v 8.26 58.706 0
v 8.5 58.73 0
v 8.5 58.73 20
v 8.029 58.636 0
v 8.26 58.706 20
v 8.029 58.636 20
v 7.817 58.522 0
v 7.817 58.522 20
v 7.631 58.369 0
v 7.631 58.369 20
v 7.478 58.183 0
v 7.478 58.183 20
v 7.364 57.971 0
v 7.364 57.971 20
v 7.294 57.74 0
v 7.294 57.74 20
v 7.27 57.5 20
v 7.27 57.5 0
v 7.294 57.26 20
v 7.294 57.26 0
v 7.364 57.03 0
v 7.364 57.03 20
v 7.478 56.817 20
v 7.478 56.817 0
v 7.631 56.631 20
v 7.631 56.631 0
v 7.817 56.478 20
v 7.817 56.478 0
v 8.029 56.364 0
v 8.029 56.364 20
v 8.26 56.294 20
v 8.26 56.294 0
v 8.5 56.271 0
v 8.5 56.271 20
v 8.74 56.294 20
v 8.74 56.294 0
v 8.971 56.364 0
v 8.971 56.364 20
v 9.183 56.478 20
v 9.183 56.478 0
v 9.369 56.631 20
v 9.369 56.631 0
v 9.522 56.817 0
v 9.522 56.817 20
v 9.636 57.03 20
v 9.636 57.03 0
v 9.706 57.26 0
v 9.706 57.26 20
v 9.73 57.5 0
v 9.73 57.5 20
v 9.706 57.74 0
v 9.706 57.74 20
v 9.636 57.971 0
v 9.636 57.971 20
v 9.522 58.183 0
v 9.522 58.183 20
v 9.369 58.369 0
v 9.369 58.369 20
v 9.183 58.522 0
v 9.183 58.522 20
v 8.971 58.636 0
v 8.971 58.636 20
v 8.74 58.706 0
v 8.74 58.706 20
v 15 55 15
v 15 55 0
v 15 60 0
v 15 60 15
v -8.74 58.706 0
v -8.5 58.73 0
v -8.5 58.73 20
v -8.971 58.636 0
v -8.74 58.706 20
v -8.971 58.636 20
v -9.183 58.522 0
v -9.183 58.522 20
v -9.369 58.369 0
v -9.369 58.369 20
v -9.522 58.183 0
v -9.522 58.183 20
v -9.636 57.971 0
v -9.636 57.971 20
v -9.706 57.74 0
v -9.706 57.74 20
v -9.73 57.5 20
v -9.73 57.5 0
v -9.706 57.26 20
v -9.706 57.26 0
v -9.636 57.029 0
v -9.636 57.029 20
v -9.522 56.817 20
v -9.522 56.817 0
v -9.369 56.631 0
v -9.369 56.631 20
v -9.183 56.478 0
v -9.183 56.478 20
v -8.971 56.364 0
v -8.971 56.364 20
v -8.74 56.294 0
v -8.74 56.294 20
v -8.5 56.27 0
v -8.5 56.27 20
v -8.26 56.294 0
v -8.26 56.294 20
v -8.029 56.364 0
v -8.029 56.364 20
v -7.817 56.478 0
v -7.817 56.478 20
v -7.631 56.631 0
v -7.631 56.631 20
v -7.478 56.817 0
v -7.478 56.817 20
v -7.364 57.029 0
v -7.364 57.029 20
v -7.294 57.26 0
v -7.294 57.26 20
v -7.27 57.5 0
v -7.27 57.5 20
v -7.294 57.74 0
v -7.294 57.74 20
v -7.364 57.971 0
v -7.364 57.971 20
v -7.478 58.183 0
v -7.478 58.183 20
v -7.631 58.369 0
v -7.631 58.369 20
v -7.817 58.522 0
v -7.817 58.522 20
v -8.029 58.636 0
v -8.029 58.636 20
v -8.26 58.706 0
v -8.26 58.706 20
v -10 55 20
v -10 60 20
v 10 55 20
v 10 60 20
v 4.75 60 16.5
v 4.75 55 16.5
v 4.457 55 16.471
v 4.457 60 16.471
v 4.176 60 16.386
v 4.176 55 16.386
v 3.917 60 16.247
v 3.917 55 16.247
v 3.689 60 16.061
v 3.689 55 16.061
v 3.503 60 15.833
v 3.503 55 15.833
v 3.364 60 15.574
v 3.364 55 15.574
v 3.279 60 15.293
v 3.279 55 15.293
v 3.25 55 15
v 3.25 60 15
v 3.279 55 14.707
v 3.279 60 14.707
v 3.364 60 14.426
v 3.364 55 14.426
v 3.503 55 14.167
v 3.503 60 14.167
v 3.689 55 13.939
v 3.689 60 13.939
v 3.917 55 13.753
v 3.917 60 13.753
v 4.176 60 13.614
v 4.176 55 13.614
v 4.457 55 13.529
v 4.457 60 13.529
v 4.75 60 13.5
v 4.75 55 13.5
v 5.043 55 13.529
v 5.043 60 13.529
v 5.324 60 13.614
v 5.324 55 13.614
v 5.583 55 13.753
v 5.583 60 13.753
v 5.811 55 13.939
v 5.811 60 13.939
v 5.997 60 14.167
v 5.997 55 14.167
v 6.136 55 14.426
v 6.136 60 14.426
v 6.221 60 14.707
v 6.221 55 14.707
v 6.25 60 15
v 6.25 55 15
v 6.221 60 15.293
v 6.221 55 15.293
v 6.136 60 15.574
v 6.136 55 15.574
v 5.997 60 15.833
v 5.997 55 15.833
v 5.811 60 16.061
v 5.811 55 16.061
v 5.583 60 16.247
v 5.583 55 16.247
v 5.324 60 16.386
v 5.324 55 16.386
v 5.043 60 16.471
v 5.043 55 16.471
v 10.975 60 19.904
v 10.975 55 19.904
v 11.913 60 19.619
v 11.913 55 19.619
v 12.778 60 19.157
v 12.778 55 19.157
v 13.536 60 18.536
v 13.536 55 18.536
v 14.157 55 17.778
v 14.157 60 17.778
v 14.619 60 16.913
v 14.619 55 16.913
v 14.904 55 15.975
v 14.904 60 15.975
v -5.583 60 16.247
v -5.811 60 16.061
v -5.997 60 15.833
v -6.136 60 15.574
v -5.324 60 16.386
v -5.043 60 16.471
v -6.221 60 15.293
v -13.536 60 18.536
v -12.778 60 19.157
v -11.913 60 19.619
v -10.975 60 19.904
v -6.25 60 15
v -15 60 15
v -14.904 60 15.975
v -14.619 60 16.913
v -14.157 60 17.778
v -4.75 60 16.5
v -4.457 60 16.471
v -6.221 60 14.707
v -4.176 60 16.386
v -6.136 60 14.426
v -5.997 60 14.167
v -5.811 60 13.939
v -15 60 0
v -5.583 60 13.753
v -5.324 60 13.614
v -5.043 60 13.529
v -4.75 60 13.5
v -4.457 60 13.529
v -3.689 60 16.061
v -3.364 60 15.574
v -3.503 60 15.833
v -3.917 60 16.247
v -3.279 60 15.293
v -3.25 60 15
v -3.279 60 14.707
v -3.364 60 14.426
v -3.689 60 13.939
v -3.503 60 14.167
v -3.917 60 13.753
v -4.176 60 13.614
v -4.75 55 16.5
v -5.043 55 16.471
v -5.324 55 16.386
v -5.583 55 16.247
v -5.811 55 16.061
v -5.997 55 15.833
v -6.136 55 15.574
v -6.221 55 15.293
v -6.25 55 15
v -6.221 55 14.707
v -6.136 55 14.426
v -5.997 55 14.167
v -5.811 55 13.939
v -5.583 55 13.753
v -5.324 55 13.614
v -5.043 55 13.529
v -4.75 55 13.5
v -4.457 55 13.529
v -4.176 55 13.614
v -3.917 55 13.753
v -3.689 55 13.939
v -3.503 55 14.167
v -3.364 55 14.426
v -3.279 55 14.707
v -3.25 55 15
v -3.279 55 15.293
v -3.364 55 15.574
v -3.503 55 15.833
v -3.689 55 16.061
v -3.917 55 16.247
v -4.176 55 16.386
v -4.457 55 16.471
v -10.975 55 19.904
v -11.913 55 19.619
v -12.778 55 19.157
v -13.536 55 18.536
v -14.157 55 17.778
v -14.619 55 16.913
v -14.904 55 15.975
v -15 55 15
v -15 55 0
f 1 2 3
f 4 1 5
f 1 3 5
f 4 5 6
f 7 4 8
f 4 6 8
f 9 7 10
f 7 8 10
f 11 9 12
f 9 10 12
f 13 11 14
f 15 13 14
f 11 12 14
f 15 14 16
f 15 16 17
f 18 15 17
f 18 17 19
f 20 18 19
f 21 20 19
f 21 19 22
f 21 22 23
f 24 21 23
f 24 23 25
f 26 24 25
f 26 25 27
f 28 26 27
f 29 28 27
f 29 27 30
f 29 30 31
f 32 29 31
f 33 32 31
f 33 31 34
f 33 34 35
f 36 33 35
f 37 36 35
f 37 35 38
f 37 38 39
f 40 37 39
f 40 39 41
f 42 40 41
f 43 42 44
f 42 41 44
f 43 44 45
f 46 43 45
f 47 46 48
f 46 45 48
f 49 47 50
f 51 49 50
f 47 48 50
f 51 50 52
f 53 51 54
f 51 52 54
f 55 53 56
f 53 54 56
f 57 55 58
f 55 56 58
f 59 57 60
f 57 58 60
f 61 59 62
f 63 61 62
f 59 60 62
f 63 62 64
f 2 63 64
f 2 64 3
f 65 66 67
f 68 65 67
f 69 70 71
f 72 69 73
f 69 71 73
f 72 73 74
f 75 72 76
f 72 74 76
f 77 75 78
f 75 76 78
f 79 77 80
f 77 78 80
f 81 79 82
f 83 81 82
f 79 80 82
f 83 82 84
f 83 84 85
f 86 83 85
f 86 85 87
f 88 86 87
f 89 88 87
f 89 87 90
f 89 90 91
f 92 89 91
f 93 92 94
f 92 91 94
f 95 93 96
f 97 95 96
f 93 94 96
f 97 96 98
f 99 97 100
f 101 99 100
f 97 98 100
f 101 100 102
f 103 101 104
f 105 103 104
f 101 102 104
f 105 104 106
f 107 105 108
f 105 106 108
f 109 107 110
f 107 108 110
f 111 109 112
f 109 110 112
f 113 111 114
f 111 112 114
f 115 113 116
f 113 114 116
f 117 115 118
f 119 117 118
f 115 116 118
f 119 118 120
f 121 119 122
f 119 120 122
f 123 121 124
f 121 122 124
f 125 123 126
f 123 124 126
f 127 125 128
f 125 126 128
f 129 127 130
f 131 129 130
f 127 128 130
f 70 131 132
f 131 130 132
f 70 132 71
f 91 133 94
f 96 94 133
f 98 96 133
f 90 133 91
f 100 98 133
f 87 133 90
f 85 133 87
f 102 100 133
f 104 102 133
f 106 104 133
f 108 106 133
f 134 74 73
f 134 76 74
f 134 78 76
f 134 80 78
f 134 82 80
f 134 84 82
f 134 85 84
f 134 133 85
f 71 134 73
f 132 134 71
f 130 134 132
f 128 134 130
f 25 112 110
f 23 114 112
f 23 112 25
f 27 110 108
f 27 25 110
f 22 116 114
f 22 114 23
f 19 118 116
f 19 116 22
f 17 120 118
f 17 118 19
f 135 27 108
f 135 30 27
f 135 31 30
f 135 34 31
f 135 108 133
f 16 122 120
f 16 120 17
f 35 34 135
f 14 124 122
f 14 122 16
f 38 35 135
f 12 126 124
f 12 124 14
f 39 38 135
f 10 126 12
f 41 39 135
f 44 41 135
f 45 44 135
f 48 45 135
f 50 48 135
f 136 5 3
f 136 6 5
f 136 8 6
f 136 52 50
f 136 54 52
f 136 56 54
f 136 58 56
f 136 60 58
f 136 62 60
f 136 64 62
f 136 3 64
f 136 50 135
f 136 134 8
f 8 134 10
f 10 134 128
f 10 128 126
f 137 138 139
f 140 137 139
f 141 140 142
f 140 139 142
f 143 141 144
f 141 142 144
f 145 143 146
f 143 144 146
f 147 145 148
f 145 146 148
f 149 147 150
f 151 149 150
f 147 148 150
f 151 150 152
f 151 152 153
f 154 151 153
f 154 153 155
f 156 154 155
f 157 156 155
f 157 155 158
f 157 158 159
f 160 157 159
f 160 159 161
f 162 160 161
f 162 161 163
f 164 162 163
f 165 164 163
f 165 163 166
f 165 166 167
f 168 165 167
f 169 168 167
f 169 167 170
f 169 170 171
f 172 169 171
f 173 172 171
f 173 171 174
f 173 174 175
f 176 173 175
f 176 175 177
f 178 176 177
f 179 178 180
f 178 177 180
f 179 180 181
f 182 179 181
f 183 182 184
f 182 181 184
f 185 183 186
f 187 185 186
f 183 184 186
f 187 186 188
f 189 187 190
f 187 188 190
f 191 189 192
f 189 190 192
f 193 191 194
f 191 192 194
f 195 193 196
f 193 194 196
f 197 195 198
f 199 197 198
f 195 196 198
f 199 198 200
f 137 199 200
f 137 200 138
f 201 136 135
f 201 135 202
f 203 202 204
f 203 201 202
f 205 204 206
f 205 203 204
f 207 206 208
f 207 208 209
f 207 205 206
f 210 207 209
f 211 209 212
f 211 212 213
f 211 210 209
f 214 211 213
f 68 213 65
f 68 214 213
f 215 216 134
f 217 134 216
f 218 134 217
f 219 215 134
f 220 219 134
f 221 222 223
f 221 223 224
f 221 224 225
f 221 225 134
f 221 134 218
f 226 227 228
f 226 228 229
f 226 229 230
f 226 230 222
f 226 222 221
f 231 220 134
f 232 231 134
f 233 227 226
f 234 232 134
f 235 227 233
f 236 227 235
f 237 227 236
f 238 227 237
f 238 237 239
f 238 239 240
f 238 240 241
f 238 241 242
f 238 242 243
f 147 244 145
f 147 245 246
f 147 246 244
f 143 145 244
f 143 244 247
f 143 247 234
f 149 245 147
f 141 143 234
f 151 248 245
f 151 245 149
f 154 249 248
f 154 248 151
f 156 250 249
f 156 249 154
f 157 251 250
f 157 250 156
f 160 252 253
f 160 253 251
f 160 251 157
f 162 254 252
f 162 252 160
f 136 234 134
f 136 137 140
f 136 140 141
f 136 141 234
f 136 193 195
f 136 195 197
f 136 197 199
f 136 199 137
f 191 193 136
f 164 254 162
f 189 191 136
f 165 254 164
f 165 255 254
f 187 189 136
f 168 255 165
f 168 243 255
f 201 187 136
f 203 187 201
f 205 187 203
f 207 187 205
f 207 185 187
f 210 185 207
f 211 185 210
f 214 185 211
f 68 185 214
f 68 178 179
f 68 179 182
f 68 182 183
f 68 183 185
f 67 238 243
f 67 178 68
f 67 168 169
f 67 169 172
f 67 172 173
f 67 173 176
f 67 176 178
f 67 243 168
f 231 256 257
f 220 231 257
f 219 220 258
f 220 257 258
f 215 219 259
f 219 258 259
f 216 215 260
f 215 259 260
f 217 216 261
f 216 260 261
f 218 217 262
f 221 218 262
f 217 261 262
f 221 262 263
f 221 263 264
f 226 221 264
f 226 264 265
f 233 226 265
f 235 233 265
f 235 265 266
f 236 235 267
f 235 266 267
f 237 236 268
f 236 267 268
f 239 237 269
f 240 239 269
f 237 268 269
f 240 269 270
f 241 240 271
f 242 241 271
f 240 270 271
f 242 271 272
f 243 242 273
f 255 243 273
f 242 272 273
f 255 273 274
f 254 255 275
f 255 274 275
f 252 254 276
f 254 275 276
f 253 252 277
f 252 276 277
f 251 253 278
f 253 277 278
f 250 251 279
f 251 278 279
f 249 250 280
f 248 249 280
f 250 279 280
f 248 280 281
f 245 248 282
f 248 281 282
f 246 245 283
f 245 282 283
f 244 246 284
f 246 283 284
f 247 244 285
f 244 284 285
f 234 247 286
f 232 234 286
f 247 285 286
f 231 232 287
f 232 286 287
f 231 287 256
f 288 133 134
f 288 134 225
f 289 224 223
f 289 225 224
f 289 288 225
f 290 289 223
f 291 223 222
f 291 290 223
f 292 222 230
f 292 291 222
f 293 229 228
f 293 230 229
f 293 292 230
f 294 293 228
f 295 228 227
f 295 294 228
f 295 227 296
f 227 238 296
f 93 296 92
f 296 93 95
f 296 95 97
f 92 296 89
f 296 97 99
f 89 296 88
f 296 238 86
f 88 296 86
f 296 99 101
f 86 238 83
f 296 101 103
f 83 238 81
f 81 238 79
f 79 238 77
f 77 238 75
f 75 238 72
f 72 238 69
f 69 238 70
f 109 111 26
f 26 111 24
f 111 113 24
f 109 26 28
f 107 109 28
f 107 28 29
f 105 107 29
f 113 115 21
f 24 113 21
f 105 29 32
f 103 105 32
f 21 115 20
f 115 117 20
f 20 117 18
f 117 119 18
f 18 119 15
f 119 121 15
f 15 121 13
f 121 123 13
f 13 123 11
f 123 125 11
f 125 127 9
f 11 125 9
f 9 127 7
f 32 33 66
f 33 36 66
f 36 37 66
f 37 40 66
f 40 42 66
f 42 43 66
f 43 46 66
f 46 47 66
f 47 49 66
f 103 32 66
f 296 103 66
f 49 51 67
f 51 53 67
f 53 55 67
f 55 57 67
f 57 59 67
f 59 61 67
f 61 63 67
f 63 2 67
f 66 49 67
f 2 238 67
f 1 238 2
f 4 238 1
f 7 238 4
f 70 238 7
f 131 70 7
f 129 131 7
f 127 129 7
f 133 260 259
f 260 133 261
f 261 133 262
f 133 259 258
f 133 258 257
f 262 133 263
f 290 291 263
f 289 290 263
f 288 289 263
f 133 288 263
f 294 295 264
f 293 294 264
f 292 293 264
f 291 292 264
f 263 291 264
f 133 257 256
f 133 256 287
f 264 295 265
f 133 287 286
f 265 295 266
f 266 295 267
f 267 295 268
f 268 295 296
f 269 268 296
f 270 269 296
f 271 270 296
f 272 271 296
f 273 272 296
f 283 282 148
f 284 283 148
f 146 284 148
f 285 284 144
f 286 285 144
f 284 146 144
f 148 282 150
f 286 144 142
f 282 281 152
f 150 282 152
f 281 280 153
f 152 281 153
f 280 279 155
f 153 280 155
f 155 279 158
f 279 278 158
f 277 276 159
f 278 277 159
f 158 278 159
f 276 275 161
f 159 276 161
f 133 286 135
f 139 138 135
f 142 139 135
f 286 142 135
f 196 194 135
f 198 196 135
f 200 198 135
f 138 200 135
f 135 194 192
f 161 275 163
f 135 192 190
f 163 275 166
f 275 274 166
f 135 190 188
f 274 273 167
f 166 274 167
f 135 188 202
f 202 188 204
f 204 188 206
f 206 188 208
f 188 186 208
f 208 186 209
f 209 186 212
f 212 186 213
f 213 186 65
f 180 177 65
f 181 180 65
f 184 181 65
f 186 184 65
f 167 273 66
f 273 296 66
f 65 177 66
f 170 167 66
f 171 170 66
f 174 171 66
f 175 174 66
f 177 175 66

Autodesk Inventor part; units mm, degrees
ref_plane "YZ Plane" through (0, 0, 0) normal (1, 0, 0) x (0, 1, 0)
ref_plane "XZ Plane" through (0, 0, 0) normal (0, 1, 0) x (-1, 0, 0)
ref_plane "XY Plane" through (0, 0, 0) normal (0, 0, 1) x (1, 0, 0)
sketch "Sketch1" plane through (0, 0, 0) normal (0, 0, 1) x (1, 0, 0)
  line L0 (-29, 60) -> (29, 60) projected
  line L1 (15, 60) -> (-15, 60)
  line L2 (-15, 60) -> (-15, 55)
  line L3 (-15, 55) -> (15, 55)
  line L4 (15, 55) -> (15, 60)
  point P0 (0, 0)
  point P1 (-15, 60)
  dimension "d0" = 5
  dimension "d1" = 15
  dimension "d2" = 15
extrude "Extrusion1" add sketch "Sketch1" along normal blind 20
sketch "Sketch2" plane through (-15, 60, 0) normal (0, 1, 0) x (1, 0, 0)
  circle A0 centre (19.75, -15) radius 1.5
  circle A1 centre (10.25, -15) radius 1.5
  line L0 (30, -20) -> (0, -20) projected
  line L1 (0, 0) -> (0, -20) projected
  point P0 (15, 0)
  dimension "d5" = 9.5
  dimension "d6" = 5
  dimension "d7" = 5
  dimension "d8" = 10.25
  dimension "d9" = 3
  dimension "d10" = 3
hole "Hole1" at (4.75, 60, 15) at (-4.75, 60, 15) direction (0, -1, 0) diameter 3 depth 20 tip angle 118
fillet "Fillet1" radius 5 2 edges at (15, 57.5, 20) (-15, 57.5, 20)
sketch "Sketch3" plane through (0, 0, 0) normal (0, 0, -1) x (-1, 0, 0)
  circle A0 centre (-8.5, 57.5001) radius 1.5 projected
  circle A1 centre (8.5, 57.5) radius 1.5 projected
  point P0 (0, 0)
hole "Hole2" at (8.5, 57.5001, 0) at (-8.5, 57.5, 0) direction (0, 0, 1) diameter 2.459 depth 20 tip angle 118 thread size "M3x0.5" class "6H" standard "ISO Metric profile"
equation "\"d11\" = d10"
properties part number "Z-Endstophalter1"
